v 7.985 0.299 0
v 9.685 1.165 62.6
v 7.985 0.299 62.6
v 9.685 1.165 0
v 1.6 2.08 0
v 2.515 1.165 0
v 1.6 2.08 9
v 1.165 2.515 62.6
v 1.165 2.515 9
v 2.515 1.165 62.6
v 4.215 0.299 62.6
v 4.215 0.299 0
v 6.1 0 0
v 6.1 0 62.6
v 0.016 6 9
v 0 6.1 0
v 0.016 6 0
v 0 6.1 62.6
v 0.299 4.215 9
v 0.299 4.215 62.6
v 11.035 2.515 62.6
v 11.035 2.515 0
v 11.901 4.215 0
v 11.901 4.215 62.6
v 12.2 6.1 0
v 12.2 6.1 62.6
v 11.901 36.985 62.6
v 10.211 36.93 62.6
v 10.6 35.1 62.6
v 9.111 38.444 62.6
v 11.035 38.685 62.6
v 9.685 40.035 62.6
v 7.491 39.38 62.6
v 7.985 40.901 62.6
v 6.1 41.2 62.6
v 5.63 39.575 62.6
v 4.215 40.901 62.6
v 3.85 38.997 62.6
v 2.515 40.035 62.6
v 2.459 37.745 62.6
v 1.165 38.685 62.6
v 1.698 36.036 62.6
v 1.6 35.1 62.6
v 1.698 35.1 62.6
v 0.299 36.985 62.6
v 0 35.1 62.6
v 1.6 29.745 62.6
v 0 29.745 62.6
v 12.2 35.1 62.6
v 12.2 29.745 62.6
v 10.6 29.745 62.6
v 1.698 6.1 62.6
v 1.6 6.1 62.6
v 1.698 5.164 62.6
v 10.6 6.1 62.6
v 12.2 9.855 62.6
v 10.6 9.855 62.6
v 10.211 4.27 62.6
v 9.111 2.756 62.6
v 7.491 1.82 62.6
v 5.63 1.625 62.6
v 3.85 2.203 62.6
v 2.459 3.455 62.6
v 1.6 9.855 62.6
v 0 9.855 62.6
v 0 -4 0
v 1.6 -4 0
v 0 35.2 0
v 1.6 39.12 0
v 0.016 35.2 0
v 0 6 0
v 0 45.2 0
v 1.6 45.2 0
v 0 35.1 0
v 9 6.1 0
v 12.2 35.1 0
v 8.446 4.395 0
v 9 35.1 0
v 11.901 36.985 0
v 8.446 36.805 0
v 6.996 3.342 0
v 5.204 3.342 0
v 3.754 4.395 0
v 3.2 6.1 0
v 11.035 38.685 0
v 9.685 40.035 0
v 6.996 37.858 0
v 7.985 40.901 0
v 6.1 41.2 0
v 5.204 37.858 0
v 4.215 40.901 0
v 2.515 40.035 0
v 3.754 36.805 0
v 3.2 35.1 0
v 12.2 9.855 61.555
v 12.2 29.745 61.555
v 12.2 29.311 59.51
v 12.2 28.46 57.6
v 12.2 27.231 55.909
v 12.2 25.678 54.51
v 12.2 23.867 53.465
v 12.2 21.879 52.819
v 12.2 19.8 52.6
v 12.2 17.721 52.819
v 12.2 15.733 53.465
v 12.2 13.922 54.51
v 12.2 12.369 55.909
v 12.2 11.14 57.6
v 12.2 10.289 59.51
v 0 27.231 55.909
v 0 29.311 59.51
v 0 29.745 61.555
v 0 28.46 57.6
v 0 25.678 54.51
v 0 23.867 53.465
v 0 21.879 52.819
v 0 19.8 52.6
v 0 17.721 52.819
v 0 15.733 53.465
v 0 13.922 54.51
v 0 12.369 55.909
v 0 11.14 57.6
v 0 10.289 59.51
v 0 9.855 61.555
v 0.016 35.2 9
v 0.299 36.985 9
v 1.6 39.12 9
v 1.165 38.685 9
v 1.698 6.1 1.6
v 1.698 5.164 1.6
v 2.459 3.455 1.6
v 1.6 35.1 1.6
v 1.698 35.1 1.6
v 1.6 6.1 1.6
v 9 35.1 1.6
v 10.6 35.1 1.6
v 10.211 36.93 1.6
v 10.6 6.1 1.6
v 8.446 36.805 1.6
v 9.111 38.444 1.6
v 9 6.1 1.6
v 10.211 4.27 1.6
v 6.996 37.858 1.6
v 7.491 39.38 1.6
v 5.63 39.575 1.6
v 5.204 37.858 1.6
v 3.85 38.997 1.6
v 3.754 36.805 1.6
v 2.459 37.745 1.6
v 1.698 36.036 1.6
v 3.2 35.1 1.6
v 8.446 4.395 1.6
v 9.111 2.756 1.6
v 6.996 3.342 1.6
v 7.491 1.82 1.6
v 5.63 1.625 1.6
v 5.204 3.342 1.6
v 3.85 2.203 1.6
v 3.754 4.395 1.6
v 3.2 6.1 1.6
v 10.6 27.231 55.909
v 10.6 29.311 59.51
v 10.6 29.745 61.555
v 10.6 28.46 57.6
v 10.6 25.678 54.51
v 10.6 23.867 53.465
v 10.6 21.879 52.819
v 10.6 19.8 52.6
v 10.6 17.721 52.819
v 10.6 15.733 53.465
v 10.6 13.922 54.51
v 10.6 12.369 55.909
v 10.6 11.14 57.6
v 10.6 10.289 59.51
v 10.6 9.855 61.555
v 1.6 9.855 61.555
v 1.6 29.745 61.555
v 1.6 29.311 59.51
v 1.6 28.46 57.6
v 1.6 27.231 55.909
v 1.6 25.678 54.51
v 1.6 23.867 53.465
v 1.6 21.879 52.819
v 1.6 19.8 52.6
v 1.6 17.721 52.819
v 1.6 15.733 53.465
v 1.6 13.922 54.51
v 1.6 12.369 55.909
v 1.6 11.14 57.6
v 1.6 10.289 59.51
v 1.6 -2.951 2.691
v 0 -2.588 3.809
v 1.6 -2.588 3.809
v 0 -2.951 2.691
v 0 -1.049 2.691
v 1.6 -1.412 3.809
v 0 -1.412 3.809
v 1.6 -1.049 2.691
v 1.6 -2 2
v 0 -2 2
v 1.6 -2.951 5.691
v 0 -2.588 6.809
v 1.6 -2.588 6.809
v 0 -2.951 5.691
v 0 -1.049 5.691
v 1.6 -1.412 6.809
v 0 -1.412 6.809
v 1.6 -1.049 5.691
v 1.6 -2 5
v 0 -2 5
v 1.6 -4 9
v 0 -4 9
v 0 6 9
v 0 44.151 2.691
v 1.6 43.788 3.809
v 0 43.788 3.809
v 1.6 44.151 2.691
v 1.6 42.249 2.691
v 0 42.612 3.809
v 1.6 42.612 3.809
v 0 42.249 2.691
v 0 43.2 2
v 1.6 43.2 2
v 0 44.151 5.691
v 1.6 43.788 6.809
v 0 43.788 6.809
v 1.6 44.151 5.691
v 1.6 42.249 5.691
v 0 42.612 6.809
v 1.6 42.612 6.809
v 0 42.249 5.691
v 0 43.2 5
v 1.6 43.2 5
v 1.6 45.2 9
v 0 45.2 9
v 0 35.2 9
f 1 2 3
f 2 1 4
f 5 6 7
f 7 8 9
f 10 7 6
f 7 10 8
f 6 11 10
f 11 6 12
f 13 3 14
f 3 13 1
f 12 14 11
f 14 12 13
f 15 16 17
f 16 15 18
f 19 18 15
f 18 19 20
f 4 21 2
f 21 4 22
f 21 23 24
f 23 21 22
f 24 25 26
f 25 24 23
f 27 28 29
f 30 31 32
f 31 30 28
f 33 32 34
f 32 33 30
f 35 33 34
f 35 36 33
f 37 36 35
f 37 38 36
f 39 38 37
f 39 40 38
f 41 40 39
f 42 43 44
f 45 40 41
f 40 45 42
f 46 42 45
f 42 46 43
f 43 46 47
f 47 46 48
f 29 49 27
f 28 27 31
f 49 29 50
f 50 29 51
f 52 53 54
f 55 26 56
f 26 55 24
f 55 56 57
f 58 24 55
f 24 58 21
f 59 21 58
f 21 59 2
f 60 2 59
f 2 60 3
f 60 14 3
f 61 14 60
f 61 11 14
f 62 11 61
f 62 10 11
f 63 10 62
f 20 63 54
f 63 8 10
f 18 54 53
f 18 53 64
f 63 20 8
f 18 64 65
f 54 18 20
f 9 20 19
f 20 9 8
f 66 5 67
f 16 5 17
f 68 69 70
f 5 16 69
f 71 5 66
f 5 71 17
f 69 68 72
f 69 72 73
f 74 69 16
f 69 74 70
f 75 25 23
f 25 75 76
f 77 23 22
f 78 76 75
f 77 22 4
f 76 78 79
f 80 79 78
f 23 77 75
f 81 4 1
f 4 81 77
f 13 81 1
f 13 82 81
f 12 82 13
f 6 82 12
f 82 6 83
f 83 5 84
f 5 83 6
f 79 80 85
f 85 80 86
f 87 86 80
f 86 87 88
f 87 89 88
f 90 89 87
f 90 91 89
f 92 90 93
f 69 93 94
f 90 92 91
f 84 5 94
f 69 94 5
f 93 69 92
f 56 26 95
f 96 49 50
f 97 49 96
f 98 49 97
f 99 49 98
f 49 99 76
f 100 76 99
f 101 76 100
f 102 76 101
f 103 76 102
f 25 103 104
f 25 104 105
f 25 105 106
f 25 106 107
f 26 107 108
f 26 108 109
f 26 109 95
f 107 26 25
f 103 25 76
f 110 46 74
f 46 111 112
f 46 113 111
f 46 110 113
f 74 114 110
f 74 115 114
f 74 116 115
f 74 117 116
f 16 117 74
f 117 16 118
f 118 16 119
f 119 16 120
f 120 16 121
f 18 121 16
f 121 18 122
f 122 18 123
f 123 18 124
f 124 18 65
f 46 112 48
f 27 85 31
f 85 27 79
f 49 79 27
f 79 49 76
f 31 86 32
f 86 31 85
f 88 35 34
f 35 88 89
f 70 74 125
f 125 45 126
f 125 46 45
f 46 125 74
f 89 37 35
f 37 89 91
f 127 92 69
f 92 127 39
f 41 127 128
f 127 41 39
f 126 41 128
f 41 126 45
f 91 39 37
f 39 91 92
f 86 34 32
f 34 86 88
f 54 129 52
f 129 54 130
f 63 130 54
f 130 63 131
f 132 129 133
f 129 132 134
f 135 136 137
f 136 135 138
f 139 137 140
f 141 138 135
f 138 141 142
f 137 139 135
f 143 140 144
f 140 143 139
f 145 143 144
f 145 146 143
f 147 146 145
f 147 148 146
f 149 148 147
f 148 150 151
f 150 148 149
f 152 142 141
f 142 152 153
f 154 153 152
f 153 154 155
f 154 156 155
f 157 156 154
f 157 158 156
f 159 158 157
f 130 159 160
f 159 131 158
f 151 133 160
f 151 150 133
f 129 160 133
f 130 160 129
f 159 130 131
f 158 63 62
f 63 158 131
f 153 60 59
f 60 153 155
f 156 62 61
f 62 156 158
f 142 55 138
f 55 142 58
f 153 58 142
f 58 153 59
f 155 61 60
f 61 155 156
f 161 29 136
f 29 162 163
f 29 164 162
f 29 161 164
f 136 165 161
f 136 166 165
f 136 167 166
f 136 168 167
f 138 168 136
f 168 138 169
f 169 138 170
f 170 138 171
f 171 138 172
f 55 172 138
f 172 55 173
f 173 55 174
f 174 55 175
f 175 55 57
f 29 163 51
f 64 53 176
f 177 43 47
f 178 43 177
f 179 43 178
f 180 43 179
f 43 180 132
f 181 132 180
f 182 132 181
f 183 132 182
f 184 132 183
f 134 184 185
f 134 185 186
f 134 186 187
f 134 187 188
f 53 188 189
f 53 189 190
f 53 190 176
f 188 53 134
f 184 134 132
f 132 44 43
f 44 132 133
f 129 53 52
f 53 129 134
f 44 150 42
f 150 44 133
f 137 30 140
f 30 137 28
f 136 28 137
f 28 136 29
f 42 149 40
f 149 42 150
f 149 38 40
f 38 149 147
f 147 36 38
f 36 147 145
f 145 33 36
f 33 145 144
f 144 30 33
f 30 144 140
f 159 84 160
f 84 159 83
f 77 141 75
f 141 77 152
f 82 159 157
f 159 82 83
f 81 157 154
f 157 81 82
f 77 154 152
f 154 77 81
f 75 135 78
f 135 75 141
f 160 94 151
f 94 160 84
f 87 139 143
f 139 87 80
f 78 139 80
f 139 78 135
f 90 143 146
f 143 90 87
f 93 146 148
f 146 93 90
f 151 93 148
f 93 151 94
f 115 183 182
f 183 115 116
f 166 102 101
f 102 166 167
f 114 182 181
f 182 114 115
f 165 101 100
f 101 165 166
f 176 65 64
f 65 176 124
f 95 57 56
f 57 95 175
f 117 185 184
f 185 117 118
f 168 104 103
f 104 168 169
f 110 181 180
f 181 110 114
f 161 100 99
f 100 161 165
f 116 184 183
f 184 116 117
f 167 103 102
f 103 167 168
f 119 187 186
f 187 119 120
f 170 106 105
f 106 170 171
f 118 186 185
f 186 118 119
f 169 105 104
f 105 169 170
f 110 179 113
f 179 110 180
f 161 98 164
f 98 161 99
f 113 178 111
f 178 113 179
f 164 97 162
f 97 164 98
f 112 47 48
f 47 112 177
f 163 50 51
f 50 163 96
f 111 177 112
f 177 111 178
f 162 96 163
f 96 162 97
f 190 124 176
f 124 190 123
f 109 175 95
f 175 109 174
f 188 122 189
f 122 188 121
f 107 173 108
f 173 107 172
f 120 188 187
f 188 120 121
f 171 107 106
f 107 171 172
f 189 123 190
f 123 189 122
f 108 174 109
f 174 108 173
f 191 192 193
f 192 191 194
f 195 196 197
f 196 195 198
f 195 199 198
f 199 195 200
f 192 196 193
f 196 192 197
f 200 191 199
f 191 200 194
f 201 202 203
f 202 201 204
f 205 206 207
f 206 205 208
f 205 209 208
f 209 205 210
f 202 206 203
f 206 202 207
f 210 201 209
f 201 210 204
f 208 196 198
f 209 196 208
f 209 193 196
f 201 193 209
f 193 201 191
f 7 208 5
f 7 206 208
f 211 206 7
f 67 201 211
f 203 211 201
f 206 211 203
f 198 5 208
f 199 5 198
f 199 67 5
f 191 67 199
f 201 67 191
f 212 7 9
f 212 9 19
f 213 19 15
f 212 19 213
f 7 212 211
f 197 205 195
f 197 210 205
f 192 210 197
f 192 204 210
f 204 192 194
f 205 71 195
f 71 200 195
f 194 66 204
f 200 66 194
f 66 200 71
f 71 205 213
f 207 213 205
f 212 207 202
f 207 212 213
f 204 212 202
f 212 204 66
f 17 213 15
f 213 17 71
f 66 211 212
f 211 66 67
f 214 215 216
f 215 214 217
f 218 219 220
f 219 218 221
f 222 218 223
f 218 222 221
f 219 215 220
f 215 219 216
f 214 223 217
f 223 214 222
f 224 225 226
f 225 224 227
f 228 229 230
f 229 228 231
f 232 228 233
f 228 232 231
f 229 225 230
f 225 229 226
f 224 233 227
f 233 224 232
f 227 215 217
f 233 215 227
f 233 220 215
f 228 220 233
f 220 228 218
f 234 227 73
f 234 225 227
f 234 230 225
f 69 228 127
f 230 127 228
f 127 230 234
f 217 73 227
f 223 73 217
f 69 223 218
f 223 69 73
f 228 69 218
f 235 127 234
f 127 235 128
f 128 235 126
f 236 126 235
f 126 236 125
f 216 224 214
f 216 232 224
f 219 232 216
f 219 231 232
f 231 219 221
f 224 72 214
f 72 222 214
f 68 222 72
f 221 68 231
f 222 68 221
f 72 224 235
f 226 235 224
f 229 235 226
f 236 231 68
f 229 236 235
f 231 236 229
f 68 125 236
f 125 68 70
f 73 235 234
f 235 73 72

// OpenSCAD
/**
 * LiPo Battery Cases
 * TODO:
 * [ ] add book description
 * [ ] add minimal size conditionals for bottom slot and grasp cutout
 *      [ ] slot should also have a max thickness
 * [ ] add customizer: 
 *      Lesson 4: https://www.thingiverse.com/thing:1201466
 * [ ] add sewing tabs: 
 *      https://i.materialise.com/blog/openscad-tutorial/
 * [ ] add to amped atelier github
 */

// Parametric Variables
// values are in mm that will be the default unit for printing
pBatteryLength = 61;
pBatteryWidth = 38;
pBatteryThickness = 9;
pCaseThickness = 1.6;

//Rounded Rectangle Module
module round_rectangle(l,w,t) {
    union() {
        radius = t/2;
        translate([radius,radius,0])
        cylinder(l, radius, radius);
        translate([0,radius,0])
        cube([t,w-t,l]);
        translate([radius,w-radius,0])
        cylinder(l, radius, radius);
    }
}

module sewTab() {
    //union() {
    // add cylinder to round corners
    // rotated 45ª to print w/o supports
    difference() {
        cube([pCaseThickness,10,9]);
        // sewing holes
        rotate(a=[0,90,0]) {
            translate([-3,2,-1])
            cylinder(pCaseThickness+2,1,1);
            translate([-6,2,-1])
            cylinder(pCaseThickness+2,1,1);
        }
    }
}

// Main Program
union() {
    // Hollow Case Module
    difference() {
        // case
        round_rectangle(pBatteryLength+pCaseThickness,
            pBatteryWidth+pCaseThickness+pCaseThickness,
            pBatteryThickness+pCaseThickness+pCaseThickness);
        // Battery negative space
        translate([pCaseThickness,pCaseThickness,pCaseThickness])
        round_rectangle(pBatteryLength+1,pBatteryWidth,pBatteryThickness);
        // bottom slot
        translate([pCaseThickness*2,pCaseThickness*2,-pCaseThickness])
        round_rectangle(pCaseThickness*3,
            pBatteryWidth-pCaseThickness-pCaseThickness,
            pBatteryThickness-pCaseThickness-pCaseThickness);
        // finger graps cutout
        translate([-2,
            (pBatteryWidth+pCaseThickness)/2,
            pBatteryLength+pCaseThickness])
        rotate(a=[0,90,0])
        cylinder(15,10,10);
        // end finger graps cutout
    }
    //TODO: if shouldAddTabs
    translate([0, -4, 0])
    sewTab();
    mirror([0,1,0])
    translate([0, -pBatteryWidth-pCaseThickness-pCaseThickness-4, 0])
    sewTab();
    //TODO: mirror twice more
}

// The % operator makes the object transparent for debugging
// The '#' operator highlights the object
